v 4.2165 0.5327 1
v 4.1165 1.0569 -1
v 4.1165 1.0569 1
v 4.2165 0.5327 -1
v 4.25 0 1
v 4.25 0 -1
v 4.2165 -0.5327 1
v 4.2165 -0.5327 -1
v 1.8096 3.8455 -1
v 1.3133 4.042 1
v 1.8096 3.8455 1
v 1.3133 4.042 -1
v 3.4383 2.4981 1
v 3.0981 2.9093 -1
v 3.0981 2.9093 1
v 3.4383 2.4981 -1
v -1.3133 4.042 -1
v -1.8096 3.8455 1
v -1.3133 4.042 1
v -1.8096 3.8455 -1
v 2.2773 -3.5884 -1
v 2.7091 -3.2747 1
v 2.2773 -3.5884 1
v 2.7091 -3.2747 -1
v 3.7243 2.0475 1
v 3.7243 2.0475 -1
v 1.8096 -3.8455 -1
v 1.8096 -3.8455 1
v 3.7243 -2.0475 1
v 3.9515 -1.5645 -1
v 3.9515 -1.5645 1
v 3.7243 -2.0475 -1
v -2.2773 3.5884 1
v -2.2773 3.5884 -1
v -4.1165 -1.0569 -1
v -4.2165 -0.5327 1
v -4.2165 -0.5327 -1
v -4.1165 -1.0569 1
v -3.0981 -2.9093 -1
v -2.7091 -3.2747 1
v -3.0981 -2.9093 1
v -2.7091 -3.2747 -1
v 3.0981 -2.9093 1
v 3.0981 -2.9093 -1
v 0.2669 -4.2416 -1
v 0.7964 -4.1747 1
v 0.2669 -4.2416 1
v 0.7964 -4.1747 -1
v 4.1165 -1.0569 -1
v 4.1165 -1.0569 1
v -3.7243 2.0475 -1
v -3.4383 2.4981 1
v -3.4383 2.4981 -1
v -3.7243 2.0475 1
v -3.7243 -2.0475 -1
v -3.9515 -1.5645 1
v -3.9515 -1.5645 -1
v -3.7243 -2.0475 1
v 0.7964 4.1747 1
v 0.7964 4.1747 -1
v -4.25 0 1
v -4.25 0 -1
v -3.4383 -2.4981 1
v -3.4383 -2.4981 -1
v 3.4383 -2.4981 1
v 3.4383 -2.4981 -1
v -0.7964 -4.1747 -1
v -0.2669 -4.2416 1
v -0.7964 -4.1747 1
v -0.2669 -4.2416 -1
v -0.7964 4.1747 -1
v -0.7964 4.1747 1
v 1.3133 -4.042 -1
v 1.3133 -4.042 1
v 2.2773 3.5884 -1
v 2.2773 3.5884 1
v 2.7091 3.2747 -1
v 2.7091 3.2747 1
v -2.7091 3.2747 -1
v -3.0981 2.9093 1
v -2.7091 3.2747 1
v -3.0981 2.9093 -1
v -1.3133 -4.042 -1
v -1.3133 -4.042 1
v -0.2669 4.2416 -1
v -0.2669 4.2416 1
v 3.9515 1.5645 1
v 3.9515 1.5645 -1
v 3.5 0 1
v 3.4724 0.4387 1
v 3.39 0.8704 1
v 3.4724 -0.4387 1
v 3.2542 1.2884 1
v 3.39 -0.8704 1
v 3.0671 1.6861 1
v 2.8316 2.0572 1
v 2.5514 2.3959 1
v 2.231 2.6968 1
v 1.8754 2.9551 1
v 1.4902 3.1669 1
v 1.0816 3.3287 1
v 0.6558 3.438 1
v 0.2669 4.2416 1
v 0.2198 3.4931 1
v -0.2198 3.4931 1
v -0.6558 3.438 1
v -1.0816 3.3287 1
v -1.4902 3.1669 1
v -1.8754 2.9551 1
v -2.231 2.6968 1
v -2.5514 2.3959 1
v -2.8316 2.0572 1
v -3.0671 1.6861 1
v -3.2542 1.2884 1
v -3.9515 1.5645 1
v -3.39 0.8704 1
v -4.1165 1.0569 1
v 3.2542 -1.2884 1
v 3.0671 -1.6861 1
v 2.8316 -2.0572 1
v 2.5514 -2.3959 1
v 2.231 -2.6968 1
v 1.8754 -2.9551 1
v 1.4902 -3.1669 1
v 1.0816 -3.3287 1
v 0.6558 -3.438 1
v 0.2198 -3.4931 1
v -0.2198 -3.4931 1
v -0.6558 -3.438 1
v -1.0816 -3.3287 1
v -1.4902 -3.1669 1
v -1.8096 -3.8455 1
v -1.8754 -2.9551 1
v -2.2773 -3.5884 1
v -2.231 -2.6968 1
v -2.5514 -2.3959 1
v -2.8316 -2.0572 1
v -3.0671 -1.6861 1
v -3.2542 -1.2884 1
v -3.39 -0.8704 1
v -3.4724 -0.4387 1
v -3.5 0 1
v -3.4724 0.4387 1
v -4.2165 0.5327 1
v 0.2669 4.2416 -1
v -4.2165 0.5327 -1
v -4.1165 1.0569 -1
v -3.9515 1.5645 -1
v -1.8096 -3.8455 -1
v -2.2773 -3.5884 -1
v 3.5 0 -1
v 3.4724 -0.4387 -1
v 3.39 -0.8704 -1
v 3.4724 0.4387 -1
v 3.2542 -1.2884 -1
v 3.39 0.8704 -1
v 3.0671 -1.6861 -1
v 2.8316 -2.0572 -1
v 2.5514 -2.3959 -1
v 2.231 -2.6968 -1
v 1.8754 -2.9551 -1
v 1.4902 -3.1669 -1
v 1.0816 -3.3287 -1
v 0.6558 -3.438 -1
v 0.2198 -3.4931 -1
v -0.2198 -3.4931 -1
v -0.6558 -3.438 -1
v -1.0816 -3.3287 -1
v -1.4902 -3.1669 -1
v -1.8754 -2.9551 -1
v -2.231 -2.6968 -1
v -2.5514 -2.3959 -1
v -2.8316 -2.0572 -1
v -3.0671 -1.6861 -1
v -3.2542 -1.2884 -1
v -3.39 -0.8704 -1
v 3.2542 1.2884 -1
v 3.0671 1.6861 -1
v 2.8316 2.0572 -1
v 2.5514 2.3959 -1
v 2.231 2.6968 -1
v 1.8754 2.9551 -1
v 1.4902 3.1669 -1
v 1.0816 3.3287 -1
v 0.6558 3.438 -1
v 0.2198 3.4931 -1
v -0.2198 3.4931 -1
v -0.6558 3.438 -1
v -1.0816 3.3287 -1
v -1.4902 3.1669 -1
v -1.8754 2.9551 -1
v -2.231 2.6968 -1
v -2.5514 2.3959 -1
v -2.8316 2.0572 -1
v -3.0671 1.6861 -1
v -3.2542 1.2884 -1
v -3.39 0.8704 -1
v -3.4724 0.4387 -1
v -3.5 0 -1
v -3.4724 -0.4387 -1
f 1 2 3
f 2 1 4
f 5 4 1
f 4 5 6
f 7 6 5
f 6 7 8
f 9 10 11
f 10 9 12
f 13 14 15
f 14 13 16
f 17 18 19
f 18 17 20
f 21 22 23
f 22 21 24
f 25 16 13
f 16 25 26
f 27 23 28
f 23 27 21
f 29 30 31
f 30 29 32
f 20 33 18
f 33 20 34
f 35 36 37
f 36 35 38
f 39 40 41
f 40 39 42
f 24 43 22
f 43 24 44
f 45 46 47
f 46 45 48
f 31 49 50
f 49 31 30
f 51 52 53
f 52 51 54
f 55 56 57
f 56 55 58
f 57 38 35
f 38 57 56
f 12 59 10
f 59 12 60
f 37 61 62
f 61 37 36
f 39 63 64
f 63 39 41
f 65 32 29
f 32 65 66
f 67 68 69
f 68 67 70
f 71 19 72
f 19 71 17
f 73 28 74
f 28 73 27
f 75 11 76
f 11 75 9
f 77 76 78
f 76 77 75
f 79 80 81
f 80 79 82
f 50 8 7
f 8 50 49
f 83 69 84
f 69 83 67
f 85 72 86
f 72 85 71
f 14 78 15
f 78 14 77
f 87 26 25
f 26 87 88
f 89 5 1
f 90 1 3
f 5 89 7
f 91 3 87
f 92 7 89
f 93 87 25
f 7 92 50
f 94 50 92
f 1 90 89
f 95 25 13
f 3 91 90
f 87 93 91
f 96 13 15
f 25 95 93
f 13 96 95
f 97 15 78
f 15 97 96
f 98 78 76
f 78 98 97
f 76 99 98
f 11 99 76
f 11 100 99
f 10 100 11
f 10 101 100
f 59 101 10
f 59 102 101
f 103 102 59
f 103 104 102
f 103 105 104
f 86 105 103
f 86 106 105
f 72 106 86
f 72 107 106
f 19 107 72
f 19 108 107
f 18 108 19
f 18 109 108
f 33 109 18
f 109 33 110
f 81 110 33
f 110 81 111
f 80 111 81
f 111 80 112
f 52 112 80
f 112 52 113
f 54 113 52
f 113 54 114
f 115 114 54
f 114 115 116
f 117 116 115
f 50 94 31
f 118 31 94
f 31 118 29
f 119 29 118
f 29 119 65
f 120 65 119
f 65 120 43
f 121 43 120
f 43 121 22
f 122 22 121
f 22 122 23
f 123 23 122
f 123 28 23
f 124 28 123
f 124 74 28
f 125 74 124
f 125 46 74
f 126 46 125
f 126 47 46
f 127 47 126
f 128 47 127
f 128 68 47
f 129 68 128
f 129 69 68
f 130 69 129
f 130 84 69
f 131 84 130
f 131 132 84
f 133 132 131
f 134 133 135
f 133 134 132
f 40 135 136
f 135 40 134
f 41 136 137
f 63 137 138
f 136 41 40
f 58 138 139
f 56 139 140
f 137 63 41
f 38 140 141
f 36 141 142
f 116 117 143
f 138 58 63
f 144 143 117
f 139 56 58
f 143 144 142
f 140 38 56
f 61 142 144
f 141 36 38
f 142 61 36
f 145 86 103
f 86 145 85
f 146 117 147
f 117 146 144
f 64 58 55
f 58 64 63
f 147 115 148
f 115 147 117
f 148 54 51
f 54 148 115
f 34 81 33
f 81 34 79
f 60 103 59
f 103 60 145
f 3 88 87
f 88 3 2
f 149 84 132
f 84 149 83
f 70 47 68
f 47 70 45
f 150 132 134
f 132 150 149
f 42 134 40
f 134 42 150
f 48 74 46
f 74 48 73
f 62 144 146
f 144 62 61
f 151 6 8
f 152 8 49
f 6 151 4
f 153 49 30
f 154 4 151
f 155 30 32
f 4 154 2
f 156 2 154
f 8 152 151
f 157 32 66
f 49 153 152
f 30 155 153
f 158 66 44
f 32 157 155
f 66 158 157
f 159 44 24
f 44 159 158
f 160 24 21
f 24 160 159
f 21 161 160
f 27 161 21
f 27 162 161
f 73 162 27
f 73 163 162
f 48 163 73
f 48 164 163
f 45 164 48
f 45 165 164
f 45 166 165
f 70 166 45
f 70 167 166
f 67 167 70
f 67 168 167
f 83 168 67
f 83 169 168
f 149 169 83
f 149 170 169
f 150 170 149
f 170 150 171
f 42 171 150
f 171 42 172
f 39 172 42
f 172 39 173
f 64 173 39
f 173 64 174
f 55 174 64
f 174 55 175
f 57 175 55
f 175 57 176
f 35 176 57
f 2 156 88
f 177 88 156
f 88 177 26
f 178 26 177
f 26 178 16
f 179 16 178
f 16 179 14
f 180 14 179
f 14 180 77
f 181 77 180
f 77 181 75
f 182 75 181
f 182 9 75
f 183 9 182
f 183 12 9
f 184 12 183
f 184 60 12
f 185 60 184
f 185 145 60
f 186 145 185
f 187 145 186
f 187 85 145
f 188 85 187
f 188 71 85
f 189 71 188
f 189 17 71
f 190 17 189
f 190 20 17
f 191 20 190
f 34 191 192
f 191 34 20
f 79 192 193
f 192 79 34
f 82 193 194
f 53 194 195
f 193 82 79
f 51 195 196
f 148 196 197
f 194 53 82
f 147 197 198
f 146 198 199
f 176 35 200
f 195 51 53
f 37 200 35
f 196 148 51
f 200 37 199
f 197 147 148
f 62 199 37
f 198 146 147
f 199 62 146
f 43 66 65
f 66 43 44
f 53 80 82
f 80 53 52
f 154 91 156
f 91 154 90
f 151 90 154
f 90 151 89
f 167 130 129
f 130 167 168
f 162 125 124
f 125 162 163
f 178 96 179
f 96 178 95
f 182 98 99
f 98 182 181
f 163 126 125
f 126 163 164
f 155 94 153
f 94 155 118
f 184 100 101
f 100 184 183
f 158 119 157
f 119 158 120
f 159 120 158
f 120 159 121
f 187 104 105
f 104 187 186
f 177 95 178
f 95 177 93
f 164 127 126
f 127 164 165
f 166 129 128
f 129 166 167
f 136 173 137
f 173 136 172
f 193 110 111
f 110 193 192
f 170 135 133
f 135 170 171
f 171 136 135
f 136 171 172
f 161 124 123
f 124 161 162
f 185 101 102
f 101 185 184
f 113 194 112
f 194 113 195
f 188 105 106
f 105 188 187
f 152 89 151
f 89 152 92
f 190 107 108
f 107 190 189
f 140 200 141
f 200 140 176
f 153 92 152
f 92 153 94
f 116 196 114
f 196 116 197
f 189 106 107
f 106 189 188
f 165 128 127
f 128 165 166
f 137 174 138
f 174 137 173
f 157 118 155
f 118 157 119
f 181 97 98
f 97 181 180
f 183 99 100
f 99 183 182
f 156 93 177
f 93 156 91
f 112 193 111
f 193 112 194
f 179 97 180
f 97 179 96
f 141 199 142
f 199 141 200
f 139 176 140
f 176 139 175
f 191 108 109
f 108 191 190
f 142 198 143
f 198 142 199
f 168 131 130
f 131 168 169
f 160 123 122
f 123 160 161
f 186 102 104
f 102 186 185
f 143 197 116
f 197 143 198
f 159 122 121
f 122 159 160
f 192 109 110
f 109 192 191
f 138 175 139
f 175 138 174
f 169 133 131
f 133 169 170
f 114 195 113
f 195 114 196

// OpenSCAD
$fn = 50;


difference() {
	union() {
		translate(v = [0, 0, -1.0000000000]) {
			cylinder(h = 2, r = 4.2500000000);
		}
	}
	union() {
		translate(v = [0, 0, -100.0000000000]) {
			cylinder(h = 200, r = 3.5000000000);
		}
	}
}
